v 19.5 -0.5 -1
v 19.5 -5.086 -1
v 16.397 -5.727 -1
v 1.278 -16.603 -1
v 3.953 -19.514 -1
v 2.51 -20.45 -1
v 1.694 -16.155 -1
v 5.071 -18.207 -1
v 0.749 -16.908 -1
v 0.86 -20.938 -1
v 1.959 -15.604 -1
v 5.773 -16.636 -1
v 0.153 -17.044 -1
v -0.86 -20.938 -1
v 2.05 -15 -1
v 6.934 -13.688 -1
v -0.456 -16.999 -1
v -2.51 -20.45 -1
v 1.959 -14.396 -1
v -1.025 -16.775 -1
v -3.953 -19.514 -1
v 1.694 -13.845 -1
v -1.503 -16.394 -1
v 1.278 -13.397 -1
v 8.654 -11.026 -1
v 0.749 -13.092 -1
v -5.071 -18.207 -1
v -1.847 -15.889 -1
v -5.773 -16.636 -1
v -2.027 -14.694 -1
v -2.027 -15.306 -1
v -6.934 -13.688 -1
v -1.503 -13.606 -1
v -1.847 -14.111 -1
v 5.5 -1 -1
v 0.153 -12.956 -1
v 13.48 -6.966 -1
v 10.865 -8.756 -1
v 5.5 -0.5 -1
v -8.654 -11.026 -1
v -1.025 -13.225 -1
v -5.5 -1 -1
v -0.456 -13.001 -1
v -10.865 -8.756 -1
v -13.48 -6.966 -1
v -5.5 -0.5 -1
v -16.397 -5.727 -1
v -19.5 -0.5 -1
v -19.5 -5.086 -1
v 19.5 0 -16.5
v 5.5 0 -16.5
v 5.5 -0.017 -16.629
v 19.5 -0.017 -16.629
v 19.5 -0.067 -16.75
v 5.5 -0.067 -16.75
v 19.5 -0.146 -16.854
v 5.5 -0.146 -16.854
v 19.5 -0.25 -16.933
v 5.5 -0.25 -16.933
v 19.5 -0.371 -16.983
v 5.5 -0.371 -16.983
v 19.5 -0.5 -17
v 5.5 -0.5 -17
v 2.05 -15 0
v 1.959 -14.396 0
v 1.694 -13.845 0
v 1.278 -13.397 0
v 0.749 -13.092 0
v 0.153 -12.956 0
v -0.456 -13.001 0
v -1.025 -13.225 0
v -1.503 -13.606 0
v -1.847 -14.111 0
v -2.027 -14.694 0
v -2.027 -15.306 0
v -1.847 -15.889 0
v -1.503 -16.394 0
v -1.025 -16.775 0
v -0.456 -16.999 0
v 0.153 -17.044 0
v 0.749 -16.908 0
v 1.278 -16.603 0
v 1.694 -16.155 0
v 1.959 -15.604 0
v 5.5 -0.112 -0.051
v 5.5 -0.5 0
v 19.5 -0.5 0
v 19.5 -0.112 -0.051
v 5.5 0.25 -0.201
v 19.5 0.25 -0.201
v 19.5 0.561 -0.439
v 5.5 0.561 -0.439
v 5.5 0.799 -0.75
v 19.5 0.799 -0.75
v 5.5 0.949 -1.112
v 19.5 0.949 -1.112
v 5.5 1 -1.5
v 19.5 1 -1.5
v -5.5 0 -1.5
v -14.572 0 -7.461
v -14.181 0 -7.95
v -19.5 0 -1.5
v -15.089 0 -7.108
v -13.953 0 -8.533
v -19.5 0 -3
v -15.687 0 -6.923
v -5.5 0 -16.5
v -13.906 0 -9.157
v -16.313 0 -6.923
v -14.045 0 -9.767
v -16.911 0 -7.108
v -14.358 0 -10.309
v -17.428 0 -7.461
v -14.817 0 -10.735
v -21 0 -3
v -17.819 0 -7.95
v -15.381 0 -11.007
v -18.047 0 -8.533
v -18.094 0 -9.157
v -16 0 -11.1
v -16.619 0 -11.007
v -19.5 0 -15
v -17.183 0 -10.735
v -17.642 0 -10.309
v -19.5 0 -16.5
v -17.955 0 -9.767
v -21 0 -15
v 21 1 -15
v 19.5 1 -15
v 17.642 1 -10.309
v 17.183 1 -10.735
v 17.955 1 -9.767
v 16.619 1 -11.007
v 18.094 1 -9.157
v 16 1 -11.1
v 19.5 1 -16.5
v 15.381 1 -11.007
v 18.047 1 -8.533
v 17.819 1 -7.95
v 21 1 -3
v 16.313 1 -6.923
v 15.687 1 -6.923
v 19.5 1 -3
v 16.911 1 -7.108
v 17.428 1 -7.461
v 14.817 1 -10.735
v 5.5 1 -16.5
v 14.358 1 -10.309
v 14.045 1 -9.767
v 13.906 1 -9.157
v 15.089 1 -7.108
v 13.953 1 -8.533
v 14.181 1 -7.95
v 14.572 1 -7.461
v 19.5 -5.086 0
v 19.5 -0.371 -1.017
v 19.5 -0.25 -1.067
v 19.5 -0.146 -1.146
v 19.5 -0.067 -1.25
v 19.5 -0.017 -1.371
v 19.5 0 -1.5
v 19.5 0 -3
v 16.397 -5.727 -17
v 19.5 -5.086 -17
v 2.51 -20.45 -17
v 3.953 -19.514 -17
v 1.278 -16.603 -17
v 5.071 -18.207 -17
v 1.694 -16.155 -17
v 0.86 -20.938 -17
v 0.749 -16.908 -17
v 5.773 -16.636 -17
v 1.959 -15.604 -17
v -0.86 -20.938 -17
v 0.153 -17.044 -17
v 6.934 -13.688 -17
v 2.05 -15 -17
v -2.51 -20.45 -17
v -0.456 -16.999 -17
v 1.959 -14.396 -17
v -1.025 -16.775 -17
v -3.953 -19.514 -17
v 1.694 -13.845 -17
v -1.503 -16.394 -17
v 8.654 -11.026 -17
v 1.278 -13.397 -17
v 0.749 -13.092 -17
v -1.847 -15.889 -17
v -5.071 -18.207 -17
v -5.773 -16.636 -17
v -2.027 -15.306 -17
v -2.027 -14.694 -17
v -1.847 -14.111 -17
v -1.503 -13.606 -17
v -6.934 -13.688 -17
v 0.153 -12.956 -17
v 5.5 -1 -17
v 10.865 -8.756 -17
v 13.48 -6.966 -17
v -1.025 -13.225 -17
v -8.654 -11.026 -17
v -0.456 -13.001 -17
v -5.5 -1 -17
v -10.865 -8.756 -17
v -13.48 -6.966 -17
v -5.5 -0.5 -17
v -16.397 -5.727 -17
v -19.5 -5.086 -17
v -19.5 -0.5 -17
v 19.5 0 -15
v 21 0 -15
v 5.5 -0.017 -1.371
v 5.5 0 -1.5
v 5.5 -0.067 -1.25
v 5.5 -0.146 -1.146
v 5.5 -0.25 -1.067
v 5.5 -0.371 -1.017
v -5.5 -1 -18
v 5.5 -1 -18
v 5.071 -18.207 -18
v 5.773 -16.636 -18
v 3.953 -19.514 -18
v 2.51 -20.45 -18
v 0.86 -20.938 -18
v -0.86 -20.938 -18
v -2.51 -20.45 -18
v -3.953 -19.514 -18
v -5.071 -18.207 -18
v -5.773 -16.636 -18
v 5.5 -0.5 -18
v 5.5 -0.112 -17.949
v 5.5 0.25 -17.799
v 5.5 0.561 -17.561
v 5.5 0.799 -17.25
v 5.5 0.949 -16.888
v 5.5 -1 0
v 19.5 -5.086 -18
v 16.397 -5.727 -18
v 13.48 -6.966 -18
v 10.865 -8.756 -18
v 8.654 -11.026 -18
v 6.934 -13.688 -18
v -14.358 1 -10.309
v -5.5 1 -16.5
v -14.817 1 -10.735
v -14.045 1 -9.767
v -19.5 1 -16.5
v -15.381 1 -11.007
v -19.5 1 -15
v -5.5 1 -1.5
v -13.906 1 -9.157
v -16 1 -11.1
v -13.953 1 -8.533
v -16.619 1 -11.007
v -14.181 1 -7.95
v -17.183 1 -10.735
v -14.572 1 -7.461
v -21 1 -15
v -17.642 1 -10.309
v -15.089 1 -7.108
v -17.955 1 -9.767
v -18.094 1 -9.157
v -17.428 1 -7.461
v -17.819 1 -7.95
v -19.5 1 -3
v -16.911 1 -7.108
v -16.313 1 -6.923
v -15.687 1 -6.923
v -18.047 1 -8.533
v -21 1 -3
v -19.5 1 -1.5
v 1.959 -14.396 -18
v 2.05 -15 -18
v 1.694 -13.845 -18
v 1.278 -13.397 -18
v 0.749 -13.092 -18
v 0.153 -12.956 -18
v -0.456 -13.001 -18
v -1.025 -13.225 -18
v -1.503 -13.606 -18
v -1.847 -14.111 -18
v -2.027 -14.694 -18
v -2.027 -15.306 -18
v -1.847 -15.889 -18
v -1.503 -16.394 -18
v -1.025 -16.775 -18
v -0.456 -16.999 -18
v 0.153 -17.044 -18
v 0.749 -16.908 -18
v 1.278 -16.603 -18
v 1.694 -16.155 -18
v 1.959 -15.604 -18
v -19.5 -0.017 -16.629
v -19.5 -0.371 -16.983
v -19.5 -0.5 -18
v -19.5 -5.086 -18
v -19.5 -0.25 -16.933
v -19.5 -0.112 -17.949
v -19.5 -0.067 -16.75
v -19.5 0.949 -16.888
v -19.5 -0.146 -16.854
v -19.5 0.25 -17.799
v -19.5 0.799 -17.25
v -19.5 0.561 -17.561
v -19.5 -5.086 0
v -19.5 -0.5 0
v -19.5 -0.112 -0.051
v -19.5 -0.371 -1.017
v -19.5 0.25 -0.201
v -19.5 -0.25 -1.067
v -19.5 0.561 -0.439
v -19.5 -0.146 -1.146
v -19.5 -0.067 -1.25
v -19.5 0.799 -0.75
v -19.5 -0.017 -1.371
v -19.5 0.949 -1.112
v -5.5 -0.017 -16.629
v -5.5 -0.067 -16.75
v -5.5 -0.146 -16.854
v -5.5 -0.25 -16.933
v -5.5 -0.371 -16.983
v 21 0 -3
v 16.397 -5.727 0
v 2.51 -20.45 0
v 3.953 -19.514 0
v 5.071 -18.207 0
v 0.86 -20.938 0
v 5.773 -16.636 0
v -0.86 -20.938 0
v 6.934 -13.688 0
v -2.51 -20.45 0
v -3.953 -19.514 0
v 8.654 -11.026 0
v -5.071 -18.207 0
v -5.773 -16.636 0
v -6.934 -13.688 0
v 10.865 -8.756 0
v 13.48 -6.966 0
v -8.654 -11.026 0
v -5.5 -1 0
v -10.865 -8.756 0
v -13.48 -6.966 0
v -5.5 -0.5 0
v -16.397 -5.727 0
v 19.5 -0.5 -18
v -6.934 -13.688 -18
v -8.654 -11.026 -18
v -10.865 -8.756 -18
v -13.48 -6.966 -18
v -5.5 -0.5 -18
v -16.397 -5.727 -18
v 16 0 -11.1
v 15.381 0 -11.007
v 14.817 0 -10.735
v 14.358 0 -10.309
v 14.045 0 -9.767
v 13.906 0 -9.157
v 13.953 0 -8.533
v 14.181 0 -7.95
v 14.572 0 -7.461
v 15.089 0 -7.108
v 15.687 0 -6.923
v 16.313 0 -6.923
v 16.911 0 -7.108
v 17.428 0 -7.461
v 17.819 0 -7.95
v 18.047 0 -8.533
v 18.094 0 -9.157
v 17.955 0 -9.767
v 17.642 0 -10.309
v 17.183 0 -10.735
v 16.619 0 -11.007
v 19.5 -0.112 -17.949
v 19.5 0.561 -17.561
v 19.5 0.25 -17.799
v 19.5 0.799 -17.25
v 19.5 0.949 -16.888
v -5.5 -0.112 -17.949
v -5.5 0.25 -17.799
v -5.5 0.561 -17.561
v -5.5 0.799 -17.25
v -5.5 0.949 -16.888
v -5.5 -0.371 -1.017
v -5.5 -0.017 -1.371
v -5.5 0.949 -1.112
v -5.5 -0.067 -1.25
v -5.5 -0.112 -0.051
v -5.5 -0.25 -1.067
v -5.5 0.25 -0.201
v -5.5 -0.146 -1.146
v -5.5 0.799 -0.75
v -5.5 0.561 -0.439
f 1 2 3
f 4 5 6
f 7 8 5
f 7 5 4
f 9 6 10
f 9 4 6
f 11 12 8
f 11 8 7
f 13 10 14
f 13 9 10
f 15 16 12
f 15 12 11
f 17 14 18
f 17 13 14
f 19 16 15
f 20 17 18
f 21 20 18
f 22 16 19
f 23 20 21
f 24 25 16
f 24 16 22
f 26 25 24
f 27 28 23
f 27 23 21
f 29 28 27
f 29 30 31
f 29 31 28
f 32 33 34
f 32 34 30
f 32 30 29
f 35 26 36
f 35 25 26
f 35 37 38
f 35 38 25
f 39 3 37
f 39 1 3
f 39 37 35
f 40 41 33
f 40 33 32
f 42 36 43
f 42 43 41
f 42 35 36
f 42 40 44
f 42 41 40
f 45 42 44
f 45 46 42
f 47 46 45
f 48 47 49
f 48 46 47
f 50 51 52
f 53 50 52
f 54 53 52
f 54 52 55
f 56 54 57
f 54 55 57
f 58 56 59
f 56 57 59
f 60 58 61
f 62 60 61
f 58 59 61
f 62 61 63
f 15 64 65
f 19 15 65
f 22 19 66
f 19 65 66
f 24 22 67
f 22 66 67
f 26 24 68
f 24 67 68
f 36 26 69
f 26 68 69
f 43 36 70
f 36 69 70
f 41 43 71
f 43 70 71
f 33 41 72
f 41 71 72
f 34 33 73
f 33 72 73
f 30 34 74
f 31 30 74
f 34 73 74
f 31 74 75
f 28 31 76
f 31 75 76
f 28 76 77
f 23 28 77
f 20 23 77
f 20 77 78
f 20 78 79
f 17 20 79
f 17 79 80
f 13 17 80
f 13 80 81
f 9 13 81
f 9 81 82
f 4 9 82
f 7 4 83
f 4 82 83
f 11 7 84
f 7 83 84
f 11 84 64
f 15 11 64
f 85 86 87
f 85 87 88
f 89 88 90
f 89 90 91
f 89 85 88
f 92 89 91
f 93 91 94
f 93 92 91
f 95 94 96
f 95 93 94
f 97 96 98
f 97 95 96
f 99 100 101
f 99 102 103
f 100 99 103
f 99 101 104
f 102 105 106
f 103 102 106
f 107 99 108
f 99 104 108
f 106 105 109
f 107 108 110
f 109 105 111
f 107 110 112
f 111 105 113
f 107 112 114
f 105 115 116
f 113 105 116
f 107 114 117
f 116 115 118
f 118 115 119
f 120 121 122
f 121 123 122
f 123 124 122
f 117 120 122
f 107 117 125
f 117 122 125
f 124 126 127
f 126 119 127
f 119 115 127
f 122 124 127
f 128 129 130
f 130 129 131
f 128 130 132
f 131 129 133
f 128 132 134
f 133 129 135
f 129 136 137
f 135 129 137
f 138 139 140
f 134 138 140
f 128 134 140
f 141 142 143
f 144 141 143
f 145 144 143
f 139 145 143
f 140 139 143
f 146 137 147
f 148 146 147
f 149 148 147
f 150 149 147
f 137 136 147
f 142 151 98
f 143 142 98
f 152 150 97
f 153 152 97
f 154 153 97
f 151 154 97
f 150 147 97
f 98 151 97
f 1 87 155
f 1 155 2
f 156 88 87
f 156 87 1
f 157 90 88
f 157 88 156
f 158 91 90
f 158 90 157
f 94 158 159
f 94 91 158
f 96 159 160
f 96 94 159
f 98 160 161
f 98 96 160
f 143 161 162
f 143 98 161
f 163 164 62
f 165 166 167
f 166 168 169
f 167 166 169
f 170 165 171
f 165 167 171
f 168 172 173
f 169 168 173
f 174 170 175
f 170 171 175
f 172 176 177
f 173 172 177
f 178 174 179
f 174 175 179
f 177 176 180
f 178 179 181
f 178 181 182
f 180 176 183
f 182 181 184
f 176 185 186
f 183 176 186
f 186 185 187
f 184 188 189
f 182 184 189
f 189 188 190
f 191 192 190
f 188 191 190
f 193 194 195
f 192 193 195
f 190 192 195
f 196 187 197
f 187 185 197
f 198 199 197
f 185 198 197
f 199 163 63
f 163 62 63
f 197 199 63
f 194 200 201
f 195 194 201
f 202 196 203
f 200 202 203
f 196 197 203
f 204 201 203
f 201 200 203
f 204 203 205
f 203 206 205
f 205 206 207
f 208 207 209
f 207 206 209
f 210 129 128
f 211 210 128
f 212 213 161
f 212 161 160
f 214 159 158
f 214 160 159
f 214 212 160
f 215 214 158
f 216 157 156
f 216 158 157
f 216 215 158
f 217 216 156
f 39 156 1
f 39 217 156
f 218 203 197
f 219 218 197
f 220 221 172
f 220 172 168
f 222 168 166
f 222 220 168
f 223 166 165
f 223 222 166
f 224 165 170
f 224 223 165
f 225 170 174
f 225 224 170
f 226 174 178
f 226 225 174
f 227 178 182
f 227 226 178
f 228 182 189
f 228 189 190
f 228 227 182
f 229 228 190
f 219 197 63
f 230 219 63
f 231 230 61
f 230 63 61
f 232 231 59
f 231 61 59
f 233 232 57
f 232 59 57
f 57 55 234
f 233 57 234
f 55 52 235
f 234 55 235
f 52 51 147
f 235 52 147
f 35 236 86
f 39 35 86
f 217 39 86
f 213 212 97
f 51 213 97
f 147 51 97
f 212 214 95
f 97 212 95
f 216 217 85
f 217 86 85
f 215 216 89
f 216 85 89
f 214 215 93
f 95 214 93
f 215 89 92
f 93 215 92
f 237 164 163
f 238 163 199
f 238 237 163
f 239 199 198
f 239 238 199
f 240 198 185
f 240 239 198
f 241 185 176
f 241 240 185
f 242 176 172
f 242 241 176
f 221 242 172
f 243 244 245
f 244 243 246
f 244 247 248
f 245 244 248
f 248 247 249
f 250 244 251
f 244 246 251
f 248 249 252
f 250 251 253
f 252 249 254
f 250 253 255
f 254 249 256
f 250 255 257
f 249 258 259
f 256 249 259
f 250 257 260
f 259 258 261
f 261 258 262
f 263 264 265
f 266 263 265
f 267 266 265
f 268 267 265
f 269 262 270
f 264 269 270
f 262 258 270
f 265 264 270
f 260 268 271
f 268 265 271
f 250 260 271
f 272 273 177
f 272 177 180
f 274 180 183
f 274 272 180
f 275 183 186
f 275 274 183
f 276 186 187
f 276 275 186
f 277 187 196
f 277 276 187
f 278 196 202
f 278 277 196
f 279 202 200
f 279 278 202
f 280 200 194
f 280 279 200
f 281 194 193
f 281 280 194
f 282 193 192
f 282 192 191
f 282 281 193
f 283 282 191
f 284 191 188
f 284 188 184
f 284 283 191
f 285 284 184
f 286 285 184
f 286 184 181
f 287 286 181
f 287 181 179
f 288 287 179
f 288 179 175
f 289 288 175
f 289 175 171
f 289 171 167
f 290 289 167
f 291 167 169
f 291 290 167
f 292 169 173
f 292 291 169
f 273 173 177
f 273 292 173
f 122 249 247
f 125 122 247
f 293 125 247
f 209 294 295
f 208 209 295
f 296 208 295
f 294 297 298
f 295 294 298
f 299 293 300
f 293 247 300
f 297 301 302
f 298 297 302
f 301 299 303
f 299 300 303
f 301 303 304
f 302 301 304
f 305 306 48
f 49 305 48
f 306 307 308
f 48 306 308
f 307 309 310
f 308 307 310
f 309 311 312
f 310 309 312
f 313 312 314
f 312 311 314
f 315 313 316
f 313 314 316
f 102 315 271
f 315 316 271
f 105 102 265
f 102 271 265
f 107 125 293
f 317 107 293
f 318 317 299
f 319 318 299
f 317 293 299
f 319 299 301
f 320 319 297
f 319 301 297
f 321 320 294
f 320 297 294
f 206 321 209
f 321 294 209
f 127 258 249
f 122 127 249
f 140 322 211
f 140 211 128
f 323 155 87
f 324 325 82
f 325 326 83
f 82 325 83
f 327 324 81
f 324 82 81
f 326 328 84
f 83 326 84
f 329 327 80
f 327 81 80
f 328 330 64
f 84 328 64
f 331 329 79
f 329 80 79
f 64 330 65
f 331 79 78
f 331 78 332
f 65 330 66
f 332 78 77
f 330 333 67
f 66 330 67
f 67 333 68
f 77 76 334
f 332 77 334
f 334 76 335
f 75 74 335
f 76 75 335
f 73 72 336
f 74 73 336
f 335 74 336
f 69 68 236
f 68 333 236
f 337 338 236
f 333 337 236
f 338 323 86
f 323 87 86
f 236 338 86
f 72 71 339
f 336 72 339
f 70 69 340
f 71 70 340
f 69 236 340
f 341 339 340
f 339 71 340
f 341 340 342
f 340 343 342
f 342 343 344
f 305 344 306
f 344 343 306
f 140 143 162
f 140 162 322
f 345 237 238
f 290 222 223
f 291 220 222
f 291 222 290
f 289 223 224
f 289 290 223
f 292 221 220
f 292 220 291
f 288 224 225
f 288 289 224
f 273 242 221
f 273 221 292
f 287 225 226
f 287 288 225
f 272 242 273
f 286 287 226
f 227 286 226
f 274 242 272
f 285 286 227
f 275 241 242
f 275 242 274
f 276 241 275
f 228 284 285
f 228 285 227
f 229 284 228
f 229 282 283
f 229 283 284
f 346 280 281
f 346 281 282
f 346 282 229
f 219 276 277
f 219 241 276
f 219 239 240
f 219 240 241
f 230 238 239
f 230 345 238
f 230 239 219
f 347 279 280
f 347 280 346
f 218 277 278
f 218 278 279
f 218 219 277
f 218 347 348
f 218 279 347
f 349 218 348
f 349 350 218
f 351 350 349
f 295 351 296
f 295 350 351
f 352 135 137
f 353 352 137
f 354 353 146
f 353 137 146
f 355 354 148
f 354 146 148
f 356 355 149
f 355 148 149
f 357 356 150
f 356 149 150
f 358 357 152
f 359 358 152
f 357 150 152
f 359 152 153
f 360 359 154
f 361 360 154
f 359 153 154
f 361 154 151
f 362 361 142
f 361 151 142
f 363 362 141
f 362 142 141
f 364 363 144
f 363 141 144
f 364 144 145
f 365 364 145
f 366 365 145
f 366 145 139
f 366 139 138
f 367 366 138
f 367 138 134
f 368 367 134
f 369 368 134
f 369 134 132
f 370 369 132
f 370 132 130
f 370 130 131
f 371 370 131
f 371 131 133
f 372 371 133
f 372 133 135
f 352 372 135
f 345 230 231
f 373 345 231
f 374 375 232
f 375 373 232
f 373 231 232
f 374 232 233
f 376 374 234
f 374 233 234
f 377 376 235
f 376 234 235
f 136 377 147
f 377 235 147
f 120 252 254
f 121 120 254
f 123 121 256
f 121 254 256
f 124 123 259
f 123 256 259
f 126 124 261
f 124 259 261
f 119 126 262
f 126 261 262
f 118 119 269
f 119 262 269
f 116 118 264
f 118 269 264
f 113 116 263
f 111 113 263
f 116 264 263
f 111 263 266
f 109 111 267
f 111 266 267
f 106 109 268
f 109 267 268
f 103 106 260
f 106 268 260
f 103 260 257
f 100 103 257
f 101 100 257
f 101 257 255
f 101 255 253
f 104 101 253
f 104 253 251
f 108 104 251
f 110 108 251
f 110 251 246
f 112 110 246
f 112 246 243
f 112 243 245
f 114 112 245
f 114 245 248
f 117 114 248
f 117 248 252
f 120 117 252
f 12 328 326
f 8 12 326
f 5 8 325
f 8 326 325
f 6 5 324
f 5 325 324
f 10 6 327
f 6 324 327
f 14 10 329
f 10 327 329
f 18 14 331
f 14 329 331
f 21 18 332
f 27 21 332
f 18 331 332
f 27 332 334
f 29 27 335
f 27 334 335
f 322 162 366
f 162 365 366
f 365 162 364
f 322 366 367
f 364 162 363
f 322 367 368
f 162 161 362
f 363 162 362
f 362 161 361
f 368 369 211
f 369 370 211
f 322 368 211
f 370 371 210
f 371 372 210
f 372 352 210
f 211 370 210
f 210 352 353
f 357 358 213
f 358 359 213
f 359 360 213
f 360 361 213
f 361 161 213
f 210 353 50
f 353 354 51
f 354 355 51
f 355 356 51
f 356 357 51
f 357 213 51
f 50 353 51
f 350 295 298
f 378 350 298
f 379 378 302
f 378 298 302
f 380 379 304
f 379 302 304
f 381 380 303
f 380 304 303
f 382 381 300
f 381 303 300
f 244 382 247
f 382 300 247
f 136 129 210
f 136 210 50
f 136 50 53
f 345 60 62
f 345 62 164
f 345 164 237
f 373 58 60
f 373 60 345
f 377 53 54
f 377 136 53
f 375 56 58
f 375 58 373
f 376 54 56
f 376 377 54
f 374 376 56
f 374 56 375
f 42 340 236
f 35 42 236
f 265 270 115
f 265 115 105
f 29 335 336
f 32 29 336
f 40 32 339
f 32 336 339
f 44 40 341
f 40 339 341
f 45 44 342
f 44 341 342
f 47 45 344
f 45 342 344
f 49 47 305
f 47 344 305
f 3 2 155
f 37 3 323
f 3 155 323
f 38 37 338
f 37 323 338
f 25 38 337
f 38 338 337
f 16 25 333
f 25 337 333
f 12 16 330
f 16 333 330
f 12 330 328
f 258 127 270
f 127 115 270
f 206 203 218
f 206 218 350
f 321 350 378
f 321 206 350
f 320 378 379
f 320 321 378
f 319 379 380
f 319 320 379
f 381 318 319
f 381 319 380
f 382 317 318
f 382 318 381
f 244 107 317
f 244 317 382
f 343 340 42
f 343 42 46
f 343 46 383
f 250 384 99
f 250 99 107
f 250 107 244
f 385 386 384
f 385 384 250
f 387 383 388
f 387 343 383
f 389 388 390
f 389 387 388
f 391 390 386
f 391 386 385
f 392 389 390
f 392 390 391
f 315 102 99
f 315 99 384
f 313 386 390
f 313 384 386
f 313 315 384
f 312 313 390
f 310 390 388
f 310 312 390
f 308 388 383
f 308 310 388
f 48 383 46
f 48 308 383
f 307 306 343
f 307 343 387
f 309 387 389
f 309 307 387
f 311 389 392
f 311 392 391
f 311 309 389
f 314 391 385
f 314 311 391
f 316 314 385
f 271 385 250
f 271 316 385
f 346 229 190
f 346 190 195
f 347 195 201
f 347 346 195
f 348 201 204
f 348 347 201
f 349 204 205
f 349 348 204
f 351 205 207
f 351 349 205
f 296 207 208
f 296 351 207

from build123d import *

# Parameters (mm, degrees)
SKETCH_1_R                       = 2.05
SM_BASE_FLANGE_2_DEPTH           = 1
SM_EDGE_FLANGE_1_STRIP_W         = 5
SM_EDGE_FLANGE_1_STRIP_H         = 1
SM_EDGE_FLANGE_1_STRIP_CUT_DEPTH = 42
SM_EDGE_FLANGE_1_DEPTH           = 42
SKETCH_13_W                      = 11
SKETCH_13_H                      = 2
CUT_EXTRUDE_1_DEPTH              = 35.727510708
SKETCH_14_R                      = 2.1
SKETCH_14_W                      = 1.5
SKETCH_14_H                      = 3
CUT_EXTRUDE_2_DEPTH              = 36.341194094


# Sheet-metal steps are written as plain solids
with BuildPart() as part:
    # Sketch 1 → Базовая кромка2 (new body)
    with BuildSketch(Plane.XY):
        with BuildLine():
            Line((-21, -5), (-21, 0))
            Line((-21, 0), (21, 0))
            Line((21, 0), (21, -5))
            ThreePointArc((21, -5), (11.451449282, -8.286050683), (5.772615091, -16.636128055))
            ThreePointArc((5.772615091, -16.636128055), (0, -21), (-5.772615091, -16.636128055))
            ThreePointArc((-5.772615091, -16.636128055), (-11.451449282, -8.286050683), (-21, -5))
        make_face()
        with Locations((0, -15)):
            Circle(SKETCH_1_R, mode=Mode.SUBTRACT)
    extrude(amount=-SM_BASE_FLANGE_2_DEPTH)

    # Ребро-кромка1 strip (across the edge) → Ребро-кромка1 strip cut (cut)
    with BuildSketch(Plane(origin=(-21, 0, -1), x_dir=(0, -1, 0), z_dir=(1, 0, 0))):
        with Locations((-2, -0.5)):
            Rectangle(SM_EDGE_FLANGE_1_STRIP_W, SM_EDGE_FLANGE_1_STRIP_H)
    extrude(amount=SM_EDGE_FLANGE_1_STRIP_CUT_DEPTH, mode=Mode.SUBTRACT)

    # Ребро-кромка1 section (across the edge) → Ребро-кромка1 (add)
    with BuildSketch(Plane(origin=(-21, 0, -1), x_dir=(0, -1, 0), z_dir=(1, 0, 0))):
        with BuildLine():
            Line((-1, 0.5), (-1, 8))
            Line((-1, 8), (0, 8))
            Line((0, 8), (0, 0.5))
            ThreePointArc((0, 0.5), (0.146446609, 0.146446609), (0.5, 0))
            Line((0.5, 0), (0.5, -1))
            ThreePointArc((0.5, -1), (-0.560660172, -0.560660172), (-1, 0.5))
        make_face()
    extrude(amount=SM_EDGE_FLANGE_1_DEPTH)

    # Зеркальное отражение1: part across plane


with BuildPart() as part_1:
    add(part.part)
    add(part.part.mirror(Plane(origin=(-21, 1, -9), x_dir=(1, 0, 0), z_dir=(0, 0, 1))))

    # Эскиз13 → Вырез-Вытянуть1 (cut, through all)
    with BuildSketch(Plane.XY):
        Rectangle(SKETCH_13_W, SKETCH_13_H)
    extrude(amount=-CUT_EXTRUDE_1_DEPTH, mode=Mode.SUBTRACT)

    # Эскиз14 → Вырез-Вытянуть2 (cut, through all)
    with BuildSketch(Plane(origin=(0, 1, 0), x_dir=(1, 0, 0), z_dir=(0, 1, 0))):
        with Locations(Location((-16, 9, 0), (0, 0, 90))):
            Circle(SKETCH_14_R)
        with Locations(Location((16, 9, 0), (0, 0, 90))):
            Circle(SKETCH_14_R)
        with Locations((-20.25, 16.5)):
            Rectangle(SKETCH_14_W, SKETCH_14_H)
        with Locations((-20.25, 1.5)):
            Rectangle(SKETCH_14_W, SKETCH_14_H)
        with Locations((20.25, 1.5)):
            Rectangle(SKETCH_14_W, SKETCH_14_H)
        with Locations((20.25, 16.5)):
            Rectangle(SKETCH_14_W, SKETCH_14_H)
    extrude(amount=-CUT_EXTRUDE_2_DEPTH, mode=Mode.SUBTRACT)


solid = part_1.part
